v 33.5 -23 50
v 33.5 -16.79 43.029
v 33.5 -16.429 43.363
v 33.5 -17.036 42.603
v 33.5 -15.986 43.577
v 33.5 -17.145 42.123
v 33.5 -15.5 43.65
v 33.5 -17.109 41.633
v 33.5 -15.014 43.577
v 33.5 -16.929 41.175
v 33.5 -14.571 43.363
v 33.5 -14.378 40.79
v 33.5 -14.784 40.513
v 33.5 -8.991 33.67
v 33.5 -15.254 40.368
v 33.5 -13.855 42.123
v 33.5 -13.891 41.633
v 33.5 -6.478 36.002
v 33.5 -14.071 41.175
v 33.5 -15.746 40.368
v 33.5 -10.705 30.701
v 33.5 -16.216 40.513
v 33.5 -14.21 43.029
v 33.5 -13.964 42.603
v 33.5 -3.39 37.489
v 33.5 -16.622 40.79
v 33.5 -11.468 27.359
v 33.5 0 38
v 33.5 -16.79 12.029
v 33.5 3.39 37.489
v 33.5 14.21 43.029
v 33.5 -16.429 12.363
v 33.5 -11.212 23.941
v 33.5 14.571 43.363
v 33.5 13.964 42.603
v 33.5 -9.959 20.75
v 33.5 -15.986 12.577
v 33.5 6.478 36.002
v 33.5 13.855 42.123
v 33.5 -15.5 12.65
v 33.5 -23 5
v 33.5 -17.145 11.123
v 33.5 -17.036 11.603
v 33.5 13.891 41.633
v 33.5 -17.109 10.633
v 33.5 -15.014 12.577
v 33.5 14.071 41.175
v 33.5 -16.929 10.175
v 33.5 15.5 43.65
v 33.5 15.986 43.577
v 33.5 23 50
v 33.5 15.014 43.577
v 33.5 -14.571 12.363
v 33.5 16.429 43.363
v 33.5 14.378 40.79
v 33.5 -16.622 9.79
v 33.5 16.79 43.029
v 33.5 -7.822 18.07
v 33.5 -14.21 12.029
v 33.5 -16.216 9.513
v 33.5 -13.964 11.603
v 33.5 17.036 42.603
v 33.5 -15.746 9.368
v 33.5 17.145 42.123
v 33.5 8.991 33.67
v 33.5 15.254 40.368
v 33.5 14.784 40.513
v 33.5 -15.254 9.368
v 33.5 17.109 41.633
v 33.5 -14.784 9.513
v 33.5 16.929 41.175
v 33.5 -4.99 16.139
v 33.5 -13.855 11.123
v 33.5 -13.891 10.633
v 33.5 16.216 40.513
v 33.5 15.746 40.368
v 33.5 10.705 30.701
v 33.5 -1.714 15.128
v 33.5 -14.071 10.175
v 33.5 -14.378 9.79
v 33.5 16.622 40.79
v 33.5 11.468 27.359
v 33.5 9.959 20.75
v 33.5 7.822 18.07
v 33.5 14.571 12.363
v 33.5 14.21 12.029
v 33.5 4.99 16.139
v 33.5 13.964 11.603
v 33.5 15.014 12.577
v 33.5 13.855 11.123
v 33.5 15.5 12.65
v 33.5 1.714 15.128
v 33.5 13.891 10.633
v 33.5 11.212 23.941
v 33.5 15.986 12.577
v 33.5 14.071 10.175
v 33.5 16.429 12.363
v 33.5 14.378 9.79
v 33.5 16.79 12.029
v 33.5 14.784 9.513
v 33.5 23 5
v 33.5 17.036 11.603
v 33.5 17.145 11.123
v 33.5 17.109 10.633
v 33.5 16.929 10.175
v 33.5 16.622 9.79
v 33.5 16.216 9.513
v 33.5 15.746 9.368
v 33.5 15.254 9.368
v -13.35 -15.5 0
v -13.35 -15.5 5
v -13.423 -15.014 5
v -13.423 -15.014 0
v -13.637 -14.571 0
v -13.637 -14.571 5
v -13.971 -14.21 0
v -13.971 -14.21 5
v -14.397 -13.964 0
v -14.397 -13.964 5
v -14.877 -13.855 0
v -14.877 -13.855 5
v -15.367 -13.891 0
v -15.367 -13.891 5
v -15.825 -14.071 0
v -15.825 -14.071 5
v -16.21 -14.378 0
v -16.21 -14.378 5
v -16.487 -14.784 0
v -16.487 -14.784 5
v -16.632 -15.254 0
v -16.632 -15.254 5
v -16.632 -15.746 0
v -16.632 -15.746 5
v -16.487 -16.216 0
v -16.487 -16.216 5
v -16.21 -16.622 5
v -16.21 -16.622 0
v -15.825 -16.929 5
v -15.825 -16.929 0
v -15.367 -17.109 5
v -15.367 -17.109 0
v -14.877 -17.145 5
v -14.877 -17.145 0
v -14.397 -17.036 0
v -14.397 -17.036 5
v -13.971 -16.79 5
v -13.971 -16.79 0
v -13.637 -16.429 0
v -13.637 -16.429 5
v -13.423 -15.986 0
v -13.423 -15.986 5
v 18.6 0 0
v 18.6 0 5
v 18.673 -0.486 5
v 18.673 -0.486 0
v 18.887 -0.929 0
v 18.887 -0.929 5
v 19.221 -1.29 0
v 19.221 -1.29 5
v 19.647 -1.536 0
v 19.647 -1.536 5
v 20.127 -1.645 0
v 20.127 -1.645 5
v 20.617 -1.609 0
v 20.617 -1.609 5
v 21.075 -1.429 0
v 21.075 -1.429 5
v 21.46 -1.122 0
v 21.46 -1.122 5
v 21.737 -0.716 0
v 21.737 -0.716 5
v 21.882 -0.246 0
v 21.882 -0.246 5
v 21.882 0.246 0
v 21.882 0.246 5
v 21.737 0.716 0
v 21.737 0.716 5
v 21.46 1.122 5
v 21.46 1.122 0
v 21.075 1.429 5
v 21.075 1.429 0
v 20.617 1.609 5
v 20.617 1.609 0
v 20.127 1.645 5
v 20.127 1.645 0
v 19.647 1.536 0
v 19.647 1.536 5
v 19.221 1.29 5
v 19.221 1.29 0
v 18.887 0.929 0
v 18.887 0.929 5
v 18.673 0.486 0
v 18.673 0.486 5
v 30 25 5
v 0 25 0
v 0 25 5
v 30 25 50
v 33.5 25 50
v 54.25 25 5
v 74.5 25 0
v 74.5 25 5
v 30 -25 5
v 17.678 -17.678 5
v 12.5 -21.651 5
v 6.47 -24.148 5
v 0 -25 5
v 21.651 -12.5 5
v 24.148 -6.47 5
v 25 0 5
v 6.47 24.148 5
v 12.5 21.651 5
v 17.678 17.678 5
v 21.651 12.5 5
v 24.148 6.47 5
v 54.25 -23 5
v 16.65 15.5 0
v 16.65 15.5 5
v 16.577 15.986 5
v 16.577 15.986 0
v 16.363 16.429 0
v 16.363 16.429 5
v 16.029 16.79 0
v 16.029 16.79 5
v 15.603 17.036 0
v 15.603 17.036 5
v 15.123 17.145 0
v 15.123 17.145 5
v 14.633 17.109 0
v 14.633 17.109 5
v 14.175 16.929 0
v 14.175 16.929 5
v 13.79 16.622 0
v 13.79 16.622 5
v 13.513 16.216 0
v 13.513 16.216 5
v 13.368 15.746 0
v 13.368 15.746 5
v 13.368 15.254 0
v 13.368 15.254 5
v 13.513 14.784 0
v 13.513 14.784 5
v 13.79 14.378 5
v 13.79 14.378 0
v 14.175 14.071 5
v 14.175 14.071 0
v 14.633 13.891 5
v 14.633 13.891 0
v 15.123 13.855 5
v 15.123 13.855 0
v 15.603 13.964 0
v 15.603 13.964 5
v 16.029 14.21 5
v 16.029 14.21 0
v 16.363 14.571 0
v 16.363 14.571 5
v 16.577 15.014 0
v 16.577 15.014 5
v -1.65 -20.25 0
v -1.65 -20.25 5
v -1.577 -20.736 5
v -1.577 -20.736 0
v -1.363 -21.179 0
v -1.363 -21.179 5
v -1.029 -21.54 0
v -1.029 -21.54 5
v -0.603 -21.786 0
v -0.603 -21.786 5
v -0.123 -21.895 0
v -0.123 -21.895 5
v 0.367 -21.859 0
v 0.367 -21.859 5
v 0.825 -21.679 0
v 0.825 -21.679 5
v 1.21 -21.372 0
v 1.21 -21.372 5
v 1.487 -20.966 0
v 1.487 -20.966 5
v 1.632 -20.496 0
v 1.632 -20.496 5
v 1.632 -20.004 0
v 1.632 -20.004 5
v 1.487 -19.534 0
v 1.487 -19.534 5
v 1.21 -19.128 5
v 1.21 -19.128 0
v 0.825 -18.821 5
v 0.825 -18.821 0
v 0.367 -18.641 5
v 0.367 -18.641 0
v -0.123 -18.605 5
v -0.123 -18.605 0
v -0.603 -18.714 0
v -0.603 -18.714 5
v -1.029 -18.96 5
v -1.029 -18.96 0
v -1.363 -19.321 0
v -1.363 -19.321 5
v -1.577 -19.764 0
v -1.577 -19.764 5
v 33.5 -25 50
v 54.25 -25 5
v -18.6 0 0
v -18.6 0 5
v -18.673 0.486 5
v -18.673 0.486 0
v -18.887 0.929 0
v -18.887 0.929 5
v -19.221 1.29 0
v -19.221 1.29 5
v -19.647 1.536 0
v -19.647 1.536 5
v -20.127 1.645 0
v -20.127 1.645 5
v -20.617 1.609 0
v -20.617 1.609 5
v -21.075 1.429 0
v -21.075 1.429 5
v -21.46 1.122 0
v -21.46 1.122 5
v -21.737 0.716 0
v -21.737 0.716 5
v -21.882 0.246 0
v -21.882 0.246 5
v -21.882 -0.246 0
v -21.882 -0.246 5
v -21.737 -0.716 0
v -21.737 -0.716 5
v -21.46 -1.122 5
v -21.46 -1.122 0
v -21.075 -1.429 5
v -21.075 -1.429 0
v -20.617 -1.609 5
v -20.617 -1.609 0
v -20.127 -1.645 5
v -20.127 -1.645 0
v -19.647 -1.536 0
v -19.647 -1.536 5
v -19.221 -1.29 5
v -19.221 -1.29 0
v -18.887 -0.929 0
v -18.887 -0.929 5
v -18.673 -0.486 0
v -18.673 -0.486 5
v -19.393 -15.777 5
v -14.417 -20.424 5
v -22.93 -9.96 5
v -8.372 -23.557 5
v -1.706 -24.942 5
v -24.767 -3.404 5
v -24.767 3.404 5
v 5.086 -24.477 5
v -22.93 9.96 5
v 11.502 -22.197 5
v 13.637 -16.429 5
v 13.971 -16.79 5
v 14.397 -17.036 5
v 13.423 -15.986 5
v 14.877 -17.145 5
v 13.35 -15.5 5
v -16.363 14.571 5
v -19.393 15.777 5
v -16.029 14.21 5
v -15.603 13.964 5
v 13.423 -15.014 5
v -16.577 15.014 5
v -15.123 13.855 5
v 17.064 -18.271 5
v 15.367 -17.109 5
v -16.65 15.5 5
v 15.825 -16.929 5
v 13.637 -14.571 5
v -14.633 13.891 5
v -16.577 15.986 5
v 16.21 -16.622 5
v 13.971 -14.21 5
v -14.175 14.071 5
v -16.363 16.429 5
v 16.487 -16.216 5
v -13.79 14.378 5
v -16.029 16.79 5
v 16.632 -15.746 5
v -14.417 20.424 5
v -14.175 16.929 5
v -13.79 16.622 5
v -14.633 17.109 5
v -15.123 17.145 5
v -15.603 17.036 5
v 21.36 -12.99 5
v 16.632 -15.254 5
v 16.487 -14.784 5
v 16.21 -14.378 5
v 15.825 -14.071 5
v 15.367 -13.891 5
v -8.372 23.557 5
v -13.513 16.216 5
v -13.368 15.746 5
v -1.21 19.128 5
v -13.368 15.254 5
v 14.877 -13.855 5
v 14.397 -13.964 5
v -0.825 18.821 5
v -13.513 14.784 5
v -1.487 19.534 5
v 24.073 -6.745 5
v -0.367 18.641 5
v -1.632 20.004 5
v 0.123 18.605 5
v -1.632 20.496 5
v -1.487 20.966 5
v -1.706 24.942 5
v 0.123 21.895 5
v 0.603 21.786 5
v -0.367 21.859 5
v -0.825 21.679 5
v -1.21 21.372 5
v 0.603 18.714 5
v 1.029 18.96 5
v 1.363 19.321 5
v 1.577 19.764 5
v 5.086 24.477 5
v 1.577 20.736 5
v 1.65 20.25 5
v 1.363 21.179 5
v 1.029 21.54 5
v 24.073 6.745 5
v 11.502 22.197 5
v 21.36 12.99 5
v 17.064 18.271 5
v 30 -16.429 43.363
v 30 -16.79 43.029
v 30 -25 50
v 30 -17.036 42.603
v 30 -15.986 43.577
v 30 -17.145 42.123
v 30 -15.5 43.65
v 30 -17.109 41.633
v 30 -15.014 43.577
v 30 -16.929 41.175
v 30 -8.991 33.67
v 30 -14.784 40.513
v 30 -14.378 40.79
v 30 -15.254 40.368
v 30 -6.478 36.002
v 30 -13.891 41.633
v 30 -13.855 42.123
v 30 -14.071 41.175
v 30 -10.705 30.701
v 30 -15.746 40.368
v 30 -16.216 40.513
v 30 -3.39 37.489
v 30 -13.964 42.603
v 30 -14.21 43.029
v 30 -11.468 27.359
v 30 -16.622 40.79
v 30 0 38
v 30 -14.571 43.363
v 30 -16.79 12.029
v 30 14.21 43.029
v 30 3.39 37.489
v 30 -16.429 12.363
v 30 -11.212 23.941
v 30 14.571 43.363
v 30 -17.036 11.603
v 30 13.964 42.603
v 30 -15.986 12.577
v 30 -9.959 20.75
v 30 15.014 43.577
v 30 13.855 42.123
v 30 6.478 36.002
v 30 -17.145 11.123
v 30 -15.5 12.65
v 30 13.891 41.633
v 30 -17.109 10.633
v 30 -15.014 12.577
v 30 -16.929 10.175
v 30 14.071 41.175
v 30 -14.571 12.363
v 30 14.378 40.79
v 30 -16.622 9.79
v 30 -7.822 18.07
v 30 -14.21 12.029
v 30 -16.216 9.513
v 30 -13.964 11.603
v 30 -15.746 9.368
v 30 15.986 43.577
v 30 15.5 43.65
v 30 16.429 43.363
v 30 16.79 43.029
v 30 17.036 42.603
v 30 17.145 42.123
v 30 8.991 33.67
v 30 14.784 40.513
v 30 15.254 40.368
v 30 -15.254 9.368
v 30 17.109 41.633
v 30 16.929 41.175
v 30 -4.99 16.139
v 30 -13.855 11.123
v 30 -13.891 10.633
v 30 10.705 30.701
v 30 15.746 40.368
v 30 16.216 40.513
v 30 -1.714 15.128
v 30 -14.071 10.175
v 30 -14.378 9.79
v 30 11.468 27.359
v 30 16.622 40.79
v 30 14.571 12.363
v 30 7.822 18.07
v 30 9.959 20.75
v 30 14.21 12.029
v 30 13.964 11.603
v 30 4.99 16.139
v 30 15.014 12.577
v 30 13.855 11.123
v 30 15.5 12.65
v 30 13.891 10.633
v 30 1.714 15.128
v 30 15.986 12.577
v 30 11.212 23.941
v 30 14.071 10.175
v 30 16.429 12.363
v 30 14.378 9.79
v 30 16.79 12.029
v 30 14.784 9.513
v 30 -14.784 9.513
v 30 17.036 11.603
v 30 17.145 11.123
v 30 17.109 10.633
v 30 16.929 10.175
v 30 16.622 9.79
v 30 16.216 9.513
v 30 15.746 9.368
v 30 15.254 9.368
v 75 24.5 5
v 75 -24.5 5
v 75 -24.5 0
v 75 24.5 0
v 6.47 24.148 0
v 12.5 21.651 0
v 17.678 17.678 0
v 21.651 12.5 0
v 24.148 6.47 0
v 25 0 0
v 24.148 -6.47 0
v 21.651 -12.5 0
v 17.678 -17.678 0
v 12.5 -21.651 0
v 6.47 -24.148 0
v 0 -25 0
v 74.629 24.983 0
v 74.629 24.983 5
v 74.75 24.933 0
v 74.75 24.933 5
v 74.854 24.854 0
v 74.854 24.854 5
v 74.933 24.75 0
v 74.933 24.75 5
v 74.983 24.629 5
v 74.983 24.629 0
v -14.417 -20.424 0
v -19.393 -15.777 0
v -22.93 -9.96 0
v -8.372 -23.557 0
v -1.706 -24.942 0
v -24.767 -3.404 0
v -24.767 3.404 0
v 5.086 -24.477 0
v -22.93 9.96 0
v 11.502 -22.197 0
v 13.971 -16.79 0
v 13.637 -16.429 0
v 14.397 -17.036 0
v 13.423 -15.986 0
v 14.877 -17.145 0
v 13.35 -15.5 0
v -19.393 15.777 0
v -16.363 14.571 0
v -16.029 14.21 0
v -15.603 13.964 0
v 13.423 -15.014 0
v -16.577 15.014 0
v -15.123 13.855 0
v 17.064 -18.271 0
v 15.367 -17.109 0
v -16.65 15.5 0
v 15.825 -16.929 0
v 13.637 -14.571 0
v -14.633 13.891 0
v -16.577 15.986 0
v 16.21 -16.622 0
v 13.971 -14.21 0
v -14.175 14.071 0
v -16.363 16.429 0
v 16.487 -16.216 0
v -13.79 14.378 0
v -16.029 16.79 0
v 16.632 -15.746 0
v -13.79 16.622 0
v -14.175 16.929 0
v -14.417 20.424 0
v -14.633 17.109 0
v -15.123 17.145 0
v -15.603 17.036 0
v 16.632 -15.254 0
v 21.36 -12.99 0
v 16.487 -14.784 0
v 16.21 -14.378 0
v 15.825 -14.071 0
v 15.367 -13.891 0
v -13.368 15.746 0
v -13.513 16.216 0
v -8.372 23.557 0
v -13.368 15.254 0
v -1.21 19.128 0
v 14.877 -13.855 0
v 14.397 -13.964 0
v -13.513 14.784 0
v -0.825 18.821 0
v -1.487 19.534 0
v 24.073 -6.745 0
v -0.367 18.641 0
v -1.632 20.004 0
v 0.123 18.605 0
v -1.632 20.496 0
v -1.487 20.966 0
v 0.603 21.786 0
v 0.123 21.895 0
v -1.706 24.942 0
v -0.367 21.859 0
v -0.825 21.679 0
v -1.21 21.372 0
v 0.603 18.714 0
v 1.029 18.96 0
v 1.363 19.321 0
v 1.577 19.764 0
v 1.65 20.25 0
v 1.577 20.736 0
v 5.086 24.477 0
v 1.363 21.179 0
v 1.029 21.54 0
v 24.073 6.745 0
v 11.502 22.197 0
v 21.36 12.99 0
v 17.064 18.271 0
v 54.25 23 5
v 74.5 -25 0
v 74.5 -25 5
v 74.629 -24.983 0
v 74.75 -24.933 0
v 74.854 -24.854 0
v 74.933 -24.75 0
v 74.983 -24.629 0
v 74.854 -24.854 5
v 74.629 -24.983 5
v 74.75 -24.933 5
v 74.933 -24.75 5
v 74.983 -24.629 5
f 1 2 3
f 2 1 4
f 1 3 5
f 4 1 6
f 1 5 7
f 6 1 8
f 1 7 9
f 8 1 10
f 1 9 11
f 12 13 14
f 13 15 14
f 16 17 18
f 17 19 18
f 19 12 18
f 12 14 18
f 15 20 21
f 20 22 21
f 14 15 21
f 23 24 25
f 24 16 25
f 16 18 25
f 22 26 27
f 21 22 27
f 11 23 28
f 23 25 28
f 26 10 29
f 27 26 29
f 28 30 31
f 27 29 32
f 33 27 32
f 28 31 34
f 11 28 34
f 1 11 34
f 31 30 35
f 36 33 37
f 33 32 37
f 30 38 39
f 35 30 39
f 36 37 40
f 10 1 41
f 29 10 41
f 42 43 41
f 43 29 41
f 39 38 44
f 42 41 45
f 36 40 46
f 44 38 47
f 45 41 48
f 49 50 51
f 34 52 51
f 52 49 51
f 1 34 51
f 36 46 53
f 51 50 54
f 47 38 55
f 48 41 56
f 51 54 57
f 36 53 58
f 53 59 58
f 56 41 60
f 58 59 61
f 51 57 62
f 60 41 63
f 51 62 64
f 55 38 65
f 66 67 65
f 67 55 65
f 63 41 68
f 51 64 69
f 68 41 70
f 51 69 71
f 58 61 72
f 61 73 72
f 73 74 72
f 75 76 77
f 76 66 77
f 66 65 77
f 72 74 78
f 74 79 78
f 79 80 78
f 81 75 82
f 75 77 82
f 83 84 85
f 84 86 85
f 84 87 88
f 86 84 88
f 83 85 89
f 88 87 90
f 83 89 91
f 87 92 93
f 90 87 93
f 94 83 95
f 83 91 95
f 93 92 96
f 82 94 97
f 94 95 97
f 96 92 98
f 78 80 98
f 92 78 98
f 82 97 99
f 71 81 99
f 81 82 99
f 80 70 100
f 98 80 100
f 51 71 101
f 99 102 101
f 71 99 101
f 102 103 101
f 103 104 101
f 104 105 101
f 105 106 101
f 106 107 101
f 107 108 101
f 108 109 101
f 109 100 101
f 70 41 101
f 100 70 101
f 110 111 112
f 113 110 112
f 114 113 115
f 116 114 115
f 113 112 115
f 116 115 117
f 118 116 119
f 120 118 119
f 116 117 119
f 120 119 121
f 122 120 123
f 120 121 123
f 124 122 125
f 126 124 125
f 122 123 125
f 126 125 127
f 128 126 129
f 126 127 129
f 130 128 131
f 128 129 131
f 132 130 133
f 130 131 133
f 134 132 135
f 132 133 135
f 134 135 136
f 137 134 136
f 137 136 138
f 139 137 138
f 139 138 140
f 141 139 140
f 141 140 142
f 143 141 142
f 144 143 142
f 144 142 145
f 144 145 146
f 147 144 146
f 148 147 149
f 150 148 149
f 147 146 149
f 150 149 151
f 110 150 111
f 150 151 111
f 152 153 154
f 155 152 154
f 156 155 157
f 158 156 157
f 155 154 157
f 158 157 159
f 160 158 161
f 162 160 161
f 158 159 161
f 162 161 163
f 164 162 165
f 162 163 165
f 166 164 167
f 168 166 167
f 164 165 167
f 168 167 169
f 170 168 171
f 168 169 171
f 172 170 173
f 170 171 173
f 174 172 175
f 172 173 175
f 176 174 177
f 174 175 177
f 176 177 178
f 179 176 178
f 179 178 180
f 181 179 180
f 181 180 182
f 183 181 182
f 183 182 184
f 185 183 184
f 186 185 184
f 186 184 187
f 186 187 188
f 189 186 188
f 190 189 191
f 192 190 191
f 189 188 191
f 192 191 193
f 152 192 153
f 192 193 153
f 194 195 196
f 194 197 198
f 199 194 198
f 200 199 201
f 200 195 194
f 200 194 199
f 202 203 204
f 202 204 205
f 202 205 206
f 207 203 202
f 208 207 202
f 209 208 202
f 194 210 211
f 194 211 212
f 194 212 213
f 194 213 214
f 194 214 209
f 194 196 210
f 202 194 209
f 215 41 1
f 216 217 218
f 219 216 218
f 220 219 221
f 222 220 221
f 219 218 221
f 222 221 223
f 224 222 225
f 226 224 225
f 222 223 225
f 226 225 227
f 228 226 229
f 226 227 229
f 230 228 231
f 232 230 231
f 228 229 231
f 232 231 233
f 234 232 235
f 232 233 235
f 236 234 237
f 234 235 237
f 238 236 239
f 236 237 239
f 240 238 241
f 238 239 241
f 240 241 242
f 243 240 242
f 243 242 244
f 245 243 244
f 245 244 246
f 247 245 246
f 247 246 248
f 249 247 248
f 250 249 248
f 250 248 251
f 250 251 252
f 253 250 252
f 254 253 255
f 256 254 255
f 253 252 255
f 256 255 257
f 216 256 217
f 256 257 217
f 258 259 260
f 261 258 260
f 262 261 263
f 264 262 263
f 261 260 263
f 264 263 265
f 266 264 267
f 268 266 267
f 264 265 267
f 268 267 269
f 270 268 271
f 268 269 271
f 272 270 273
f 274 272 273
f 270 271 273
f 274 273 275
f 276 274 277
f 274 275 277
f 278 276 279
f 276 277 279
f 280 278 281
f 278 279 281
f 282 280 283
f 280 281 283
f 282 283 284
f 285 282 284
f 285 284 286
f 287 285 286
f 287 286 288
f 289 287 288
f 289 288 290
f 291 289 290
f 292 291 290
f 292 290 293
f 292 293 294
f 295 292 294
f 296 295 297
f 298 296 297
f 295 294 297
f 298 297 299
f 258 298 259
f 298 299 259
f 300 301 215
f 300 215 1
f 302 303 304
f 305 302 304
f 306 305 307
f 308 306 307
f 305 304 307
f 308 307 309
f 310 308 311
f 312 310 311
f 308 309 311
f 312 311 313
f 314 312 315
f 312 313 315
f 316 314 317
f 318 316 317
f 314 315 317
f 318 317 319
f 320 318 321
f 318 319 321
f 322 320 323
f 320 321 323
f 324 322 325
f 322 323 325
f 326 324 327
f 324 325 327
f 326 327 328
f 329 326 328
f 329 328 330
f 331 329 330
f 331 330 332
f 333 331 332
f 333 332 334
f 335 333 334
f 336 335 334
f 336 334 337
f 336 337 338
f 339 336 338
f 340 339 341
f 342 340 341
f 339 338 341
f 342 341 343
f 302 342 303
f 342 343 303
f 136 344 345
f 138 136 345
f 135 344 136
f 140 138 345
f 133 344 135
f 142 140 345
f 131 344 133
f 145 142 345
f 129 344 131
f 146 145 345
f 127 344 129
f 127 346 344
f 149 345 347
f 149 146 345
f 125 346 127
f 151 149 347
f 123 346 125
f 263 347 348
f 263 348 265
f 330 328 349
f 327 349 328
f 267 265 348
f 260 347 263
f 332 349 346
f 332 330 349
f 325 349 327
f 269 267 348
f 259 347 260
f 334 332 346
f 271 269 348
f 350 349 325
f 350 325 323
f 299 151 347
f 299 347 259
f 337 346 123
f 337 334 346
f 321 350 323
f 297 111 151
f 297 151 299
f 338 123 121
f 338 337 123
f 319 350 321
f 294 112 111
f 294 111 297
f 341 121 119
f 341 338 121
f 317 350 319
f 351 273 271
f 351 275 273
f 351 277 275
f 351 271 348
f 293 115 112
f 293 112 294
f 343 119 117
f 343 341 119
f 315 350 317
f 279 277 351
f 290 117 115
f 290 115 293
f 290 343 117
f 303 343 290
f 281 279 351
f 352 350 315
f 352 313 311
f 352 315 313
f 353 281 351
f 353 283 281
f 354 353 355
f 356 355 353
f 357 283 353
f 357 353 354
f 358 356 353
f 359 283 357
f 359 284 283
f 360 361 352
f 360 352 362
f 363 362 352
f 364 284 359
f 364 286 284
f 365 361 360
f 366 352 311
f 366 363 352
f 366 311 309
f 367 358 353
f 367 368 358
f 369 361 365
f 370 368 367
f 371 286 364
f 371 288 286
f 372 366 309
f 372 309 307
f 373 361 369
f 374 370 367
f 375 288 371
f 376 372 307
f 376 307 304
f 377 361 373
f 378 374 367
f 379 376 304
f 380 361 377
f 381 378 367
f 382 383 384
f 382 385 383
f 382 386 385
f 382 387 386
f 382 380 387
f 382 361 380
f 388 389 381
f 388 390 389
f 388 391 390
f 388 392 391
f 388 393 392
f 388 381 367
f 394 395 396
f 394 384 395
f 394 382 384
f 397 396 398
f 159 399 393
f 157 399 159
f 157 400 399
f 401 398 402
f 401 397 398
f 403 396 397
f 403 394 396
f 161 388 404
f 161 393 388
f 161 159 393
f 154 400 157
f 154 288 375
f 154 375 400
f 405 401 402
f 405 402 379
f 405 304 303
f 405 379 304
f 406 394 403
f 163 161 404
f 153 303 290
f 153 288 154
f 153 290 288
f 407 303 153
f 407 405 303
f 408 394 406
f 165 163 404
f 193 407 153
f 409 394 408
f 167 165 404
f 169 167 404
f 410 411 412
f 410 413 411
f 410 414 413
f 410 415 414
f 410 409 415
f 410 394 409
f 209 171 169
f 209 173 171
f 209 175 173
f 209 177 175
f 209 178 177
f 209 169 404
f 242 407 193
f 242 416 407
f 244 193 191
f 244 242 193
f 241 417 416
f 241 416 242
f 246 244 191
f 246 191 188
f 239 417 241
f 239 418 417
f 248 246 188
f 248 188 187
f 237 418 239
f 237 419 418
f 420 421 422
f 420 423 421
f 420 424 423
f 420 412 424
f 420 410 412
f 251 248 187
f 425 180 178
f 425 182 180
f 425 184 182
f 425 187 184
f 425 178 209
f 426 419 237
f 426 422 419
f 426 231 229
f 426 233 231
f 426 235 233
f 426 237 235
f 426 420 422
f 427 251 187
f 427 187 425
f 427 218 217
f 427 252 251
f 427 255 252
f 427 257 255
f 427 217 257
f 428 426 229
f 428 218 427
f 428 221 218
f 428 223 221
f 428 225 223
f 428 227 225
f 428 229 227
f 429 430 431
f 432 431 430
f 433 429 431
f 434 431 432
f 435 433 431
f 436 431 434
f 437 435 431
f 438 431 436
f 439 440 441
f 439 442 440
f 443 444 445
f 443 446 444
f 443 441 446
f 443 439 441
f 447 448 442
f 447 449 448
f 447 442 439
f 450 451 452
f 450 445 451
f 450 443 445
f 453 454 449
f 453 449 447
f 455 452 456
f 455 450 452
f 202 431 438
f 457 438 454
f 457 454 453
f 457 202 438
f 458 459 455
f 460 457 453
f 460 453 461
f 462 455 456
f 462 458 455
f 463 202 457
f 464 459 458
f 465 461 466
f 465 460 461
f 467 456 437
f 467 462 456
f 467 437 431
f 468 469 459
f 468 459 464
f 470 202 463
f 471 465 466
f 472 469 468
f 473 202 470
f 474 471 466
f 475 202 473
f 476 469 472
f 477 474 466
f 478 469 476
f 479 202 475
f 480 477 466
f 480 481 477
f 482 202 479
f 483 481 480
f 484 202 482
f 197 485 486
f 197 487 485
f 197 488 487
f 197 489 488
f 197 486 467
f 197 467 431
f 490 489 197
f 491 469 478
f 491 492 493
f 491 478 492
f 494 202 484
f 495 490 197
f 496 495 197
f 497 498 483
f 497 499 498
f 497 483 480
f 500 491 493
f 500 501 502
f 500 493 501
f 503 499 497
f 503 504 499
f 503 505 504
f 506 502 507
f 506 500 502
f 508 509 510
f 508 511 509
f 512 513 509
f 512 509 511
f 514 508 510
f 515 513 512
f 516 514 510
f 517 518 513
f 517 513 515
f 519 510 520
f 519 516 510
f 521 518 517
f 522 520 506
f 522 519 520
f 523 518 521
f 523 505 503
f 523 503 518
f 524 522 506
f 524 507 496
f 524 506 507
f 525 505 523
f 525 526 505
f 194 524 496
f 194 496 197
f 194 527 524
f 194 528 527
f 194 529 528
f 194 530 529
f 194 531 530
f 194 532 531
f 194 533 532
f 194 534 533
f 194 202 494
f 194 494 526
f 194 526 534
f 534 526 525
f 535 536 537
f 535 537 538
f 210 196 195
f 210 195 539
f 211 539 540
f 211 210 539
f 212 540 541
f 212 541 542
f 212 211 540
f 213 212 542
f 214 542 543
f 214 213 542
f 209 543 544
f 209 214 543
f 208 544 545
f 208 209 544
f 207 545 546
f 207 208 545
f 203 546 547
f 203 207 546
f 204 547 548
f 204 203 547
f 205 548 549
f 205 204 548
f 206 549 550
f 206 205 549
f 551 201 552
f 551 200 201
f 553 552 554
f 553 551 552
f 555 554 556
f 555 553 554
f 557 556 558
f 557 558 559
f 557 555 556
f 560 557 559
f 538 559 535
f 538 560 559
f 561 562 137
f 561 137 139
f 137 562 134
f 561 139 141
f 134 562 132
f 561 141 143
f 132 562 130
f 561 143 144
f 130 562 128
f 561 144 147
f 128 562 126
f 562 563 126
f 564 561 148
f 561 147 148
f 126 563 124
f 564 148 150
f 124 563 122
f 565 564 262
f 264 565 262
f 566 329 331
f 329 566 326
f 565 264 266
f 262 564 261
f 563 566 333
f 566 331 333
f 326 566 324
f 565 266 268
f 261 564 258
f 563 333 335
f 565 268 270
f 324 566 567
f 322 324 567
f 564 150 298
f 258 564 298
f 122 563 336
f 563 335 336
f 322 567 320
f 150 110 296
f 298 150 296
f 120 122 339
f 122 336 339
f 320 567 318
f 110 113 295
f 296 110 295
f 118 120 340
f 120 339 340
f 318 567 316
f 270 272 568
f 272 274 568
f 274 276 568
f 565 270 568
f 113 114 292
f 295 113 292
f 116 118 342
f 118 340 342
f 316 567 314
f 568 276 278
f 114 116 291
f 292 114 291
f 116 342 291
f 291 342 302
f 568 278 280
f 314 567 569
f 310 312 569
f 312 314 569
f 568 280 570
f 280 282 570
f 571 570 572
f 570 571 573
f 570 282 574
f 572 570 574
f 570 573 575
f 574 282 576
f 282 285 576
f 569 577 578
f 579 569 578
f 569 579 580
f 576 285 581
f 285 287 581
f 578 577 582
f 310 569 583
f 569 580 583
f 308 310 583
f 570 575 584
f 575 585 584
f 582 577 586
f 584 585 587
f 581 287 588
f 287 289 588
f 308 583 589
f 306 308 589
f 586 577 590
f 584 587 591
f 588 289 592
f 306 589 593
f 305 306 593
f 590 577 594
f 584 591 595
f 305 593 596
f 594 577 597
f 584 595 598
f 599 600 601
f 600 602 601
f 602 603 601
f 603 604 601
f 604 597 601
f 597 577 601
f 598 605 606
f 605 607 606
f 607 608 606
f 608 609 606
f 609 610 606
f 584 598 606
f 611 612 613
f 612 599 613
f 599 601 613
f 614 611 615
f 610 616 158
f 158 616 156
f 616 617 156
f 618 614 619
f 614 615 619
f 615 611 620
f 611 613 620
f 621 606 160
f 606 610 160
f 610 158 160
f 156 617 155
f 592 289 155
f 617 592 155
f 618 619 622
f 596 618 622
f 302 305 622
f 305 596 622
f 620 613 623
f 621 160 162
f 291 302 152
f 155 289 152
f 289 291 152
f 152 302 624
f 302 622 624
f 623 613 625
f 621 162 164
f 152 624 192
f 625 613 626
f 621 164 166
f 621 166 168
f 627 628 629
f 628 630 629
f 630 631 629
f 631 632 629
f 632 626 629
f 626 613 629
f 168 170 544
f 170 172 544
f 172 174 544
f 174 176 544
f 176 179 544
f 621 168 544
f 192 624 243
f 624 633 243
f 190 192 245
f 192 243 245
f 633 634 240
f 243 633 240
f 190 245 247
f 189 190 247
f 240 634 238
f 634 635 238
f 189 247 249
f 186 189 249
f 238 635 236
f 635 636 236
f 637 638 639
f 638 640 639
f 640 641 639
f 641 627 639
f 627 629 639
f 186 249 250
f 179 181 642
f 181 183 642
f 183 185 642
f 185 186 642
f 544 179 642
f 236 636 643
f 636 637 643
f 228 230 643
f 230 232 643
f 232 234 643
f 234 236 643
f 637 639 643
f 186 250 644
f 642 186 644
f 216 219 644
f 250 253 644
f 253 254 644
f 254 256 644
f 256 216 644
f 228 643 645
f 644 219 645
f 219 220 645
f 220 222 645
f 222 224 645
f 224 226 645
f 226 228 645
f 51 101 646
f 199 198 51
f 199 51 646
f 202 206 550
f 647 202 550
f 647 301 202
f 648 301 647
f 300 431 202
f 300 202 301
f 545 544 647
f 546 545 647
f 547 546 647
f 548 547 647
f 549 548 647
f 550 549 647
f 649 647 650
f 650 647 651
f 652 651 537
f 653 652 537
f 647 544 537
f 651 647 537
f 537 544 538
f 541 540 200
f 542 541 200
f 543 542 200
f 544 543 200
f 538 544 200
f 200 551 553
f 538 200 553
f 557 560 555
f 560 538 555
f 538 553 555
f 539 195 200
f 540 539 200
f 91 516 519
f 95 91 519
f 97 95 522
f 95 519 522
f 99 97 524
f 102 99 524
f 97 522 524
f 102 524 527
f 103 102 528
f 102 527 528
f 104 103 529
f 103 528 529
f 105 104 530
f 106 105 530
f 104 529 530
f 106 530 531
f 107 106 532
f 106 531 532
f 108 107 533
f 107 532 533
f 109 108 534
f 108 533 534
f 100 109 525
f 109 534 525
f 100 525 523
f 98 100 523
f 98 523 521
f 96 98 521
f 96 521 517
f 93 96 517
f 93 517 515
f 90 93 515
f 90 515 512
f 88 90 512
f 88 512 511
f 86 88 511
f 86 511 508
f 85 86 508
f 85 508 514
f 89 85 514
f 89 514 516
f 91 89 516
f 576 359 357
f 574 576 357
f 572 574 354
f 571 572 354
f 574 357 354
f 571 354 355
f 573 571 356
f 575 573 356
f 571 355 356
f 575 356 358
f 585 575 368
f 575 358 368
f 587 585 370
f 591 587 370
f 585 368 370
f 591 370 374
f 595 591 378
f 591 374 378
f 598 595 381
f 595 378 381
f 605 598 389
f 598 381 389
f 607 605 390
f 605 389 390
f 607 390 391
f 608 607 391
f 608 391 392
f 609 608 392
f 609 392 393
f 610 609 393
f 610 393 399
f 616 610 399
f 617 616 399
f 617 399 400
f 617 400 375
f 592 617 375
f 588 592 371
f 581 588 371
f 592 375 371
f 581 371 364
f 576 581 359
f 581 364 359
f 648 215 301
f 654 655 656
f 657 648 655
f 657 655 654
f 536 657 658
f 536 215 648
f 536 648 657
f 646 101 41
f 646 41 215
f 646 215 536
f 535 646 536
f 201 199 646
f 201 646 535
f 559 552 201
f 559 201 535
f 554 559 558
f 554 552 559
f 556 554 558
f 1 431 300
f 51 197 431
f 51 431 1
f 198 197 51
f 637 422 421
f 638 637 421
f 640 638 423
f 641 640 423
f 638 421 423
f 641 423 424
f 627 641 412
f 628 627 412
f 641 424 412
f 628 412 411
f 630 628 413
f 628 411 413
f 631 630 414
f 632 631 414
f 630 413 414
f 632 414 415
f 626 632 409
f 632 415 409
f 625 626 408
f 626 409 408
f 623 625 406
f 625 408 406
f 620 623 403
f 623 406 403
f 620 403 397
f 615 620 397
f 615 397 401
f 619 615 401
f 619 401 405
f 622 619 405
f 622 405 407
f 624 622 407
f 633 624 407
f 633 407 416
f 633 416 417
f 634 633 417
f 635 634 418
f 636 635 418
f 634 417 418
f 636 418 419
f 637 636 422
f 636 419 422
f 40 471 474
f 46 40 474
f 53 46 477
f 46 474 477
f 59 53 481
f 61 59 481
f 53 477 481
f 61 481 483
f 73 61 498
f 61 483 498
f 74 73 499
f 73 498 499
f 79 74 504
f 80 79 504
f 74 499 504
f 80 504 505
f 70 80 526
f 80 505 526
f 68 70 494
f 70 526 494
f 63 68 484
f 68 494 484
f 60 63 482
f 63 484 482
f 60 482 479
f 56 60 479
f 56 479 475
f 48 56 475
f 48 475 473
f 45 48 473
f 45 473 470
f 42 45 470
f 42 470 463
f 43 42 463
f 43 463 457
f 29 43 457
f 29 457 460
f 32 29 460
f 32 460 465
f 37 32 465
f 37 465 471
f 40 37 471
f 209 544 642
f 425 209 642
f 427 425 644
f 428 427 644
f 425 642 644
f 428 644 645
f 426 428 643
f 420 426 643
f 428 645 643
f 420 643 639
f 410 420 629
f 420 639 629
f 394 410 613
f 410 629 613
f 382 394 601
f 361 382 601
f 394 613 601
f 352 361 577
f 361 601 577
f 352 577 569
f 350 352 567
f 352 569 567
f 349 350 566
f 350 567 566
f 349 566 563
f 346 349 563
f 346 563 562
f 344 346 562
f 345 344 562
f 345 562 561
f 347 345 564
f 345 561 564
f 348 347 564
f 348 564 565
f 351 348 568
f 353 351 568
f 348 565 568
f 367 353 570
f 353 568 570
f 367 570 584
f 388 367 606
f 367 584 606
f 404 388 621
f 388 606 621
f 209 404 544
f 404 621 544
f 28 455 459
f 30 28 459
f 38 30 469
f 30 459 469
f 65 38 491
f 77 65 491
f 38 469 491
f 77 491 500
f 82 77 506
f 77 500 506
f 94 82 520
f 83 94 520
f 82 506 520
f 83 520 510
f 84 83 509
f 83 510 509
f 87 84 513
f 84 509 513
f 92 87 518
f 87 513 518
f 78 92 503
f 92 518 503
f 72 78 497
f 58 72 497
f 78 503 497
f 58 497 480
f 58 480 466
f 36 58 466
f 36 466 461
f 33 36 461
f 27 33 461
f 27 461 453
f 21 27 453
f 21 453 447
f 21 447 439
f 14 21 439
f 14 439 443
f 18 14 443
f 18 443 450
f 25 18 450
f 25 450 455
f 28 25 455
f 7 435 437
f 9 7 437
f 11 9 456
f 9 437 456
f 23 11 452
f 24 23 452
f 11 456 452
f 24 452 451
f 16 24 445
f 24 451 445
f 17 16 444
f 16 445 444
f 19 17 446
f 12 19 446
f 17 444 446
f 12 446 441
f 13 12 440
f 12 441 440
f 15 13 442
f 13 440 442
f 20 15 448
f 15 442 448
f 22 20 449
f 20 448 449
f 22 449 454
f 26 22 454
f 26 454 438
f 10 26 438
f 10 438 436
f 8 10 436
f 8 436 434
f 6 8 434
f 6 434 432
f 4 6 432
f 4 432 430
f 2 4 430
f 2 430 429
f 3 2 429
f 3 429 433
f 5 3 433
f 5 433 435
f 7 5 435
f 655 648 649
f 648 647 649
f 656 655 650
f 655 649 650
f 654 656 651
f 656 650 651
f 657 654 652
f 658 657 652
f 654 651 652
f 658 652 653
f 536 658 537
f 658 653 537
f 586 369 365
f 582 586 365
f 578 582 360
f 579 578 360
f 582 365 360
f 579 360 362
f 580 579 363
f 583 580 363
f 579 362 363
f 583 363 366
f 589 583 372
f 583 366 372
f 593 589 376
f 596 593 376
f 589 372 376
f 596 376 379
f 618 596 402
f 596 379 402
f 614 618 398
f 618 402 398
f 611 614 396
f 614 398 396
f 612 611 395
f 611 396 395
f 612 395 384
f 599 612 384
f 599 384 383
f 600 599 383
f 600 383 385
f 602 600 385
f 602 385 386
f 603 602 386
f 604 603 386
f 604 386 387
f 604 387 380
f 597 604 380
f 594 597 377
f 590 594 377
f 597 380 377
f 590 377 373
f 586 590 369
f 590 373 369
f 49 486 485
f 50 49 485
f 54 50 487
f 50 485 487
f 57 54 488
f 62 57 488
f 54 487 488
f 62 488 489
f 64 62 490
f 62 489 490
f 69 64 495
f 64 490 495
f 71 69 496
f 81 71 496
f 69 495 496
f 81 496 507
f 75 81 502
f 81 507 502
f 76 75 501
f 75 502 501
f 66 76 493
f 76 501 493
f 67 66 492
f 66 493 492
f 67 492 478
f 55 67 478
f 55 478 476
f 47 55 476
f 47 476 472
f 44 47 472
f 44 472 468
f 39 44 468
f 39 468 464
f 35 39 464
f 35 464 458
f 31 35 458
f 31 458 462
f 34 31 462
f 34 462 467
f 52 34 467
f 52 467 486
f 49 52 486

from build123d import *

# Parameters (mm, degrees)
SKETCH_1_R          = 25
EXTRUDE_1_DEPTH     = 5
SKETCH_3_R          = 1.65
CUT_EXTRUDE_1_DEPTH = 5
EXTRUDE_2_DEPTH     = 5
SKETCH_6_W          = 3.5
SKETCH_6_H          = 50
EXTRUDE_3_DEPTH     = 45
SKETCH_7_R          = 11.5
SKETCH_7_R_2        = 1.65
CUT_EXTRUDE_2_DEPTH = 45
EXTRUDE_4_DEPTH     = 2
EXTRUDE_5_DEPTH     = 2
FILLET_1_R          = 0.5


with BuildPart() as part:
    # 草图1 → 凸台-拉伸1 (new body)
    with BuildSketch(Plane.XY):
        Circle(SKETCH_1_R)
    extrude(amount=EXTRUDE_1_DEPTH)

    # 草图3 → 切除-拉伸1 (cut)
    with BuildSketch(Plane.XY.offset(5)):
        with Locations((0, 20.25)):
            Circle(SKETCH_3_R)
        with Locations((-20.25, 0)):
            Circle(SKETCH_3_R)
        with Locations(Location((0, -20.25, 0), (0, 0, 180))):
            Circle(SKETCH_3_R)
        with Locations(Location((20.25, 0, 0), (0, 0, 180))):
            Circle(SKETCH_3_R)
        with Locations((15, 15.5)):
            Circle(SKETCH_3_R)
        with Locations(Location((15, -15.5, 0), (0, 0, 180))):
            Circle(SKETCH_3_R)
        with Locations((-15, -15.5)):
            Circle(SKETCH_3_R)
        with Locations(Location((-15, 15.5, 0), (0, 0, 180))):
            Circle(SKETCH_3_R)
    extrude(amount=-CUT_EXTRUDE_1_DEPTH, mode=Mode.SUBTRACT)


with BuildPart() as body_2:
    # 草图4 → 凸台-拉伸2 (new body)
    with BuildSketch(Plane.XY.offset(5)):
        with BuildLine():
            ThreePointArc((0, 25), (25, 0), (0, -25))
            Line((0, -25), (75, -25))
            Line((75, -25), (75, 25))
            Line((75, 25), (0, 25))
        make_face()
    extrude(amount=-EXTRUDE_2_DEPTH)

    # 草图6 → 凸台-拉伸3 (add)
    with BuildSketch(Plane.XY.offset(5)):
        with Locations((31.75, 0)):
            Rectangle(SKETCH_6_W, SKETCH_6_H)
    extrude(amount=EXTRUDE_3_DEPTH)

    # 草图7 → 切除-拉伸2 (cut)
    with BuildSketch(Plane.ZY.offset(-30)):
        with Locations((26.5, 0)):
            Circle(SKETCH_7_R)
        with Locations((42, 15.5)):
            Circle(SKETCH_7_R_2)
        with Locations((42, -15.5)):
            Circle(SKETCH_7_R_2)
        with Locations((11, -15.5)):
            Circle(SKETCH_7_R_2)
        with Locations((11, 15.5)):
            Circle(SKETCH_7_R_2)
    extrude(amount=-CUT_EXTRUDE_2_DEPTH, mode=Mode.SUBTRACT)

    # 草图9 → 凸台-拉伸4 (add)
    with BuildSketch(Plane.XZ.offset(25)):
        Polygon((33.5, 5), (54.25, 5), (33.5, 50), align=None)
    extrude(amount=-EXTRUDE_4_DEPTH)

    # 草图10 → 凸台-拉伸5 (add)
    with BuildSketch(Plane(origin=(0, 25, 0), x_dir=(1, 0, 0), z_dir=(0, 1, 0))):
        Polygon((33.5, -50), (54.25, -5), (33.5, -5), align=None)
    extrude(amount=-EXTRUDE_5_DEPTH)

    # 圆角1
    fillet_1_edges = [body_2.edges().sort_by_distance(p)[0] for p in [
        (75, 25, 2.5),
        (75, -25, 2.5),
    ]]
    fillet(fillet_1_edges, radius=FILLET_1_R)


solid = Compound([part.part, body_2.part])
